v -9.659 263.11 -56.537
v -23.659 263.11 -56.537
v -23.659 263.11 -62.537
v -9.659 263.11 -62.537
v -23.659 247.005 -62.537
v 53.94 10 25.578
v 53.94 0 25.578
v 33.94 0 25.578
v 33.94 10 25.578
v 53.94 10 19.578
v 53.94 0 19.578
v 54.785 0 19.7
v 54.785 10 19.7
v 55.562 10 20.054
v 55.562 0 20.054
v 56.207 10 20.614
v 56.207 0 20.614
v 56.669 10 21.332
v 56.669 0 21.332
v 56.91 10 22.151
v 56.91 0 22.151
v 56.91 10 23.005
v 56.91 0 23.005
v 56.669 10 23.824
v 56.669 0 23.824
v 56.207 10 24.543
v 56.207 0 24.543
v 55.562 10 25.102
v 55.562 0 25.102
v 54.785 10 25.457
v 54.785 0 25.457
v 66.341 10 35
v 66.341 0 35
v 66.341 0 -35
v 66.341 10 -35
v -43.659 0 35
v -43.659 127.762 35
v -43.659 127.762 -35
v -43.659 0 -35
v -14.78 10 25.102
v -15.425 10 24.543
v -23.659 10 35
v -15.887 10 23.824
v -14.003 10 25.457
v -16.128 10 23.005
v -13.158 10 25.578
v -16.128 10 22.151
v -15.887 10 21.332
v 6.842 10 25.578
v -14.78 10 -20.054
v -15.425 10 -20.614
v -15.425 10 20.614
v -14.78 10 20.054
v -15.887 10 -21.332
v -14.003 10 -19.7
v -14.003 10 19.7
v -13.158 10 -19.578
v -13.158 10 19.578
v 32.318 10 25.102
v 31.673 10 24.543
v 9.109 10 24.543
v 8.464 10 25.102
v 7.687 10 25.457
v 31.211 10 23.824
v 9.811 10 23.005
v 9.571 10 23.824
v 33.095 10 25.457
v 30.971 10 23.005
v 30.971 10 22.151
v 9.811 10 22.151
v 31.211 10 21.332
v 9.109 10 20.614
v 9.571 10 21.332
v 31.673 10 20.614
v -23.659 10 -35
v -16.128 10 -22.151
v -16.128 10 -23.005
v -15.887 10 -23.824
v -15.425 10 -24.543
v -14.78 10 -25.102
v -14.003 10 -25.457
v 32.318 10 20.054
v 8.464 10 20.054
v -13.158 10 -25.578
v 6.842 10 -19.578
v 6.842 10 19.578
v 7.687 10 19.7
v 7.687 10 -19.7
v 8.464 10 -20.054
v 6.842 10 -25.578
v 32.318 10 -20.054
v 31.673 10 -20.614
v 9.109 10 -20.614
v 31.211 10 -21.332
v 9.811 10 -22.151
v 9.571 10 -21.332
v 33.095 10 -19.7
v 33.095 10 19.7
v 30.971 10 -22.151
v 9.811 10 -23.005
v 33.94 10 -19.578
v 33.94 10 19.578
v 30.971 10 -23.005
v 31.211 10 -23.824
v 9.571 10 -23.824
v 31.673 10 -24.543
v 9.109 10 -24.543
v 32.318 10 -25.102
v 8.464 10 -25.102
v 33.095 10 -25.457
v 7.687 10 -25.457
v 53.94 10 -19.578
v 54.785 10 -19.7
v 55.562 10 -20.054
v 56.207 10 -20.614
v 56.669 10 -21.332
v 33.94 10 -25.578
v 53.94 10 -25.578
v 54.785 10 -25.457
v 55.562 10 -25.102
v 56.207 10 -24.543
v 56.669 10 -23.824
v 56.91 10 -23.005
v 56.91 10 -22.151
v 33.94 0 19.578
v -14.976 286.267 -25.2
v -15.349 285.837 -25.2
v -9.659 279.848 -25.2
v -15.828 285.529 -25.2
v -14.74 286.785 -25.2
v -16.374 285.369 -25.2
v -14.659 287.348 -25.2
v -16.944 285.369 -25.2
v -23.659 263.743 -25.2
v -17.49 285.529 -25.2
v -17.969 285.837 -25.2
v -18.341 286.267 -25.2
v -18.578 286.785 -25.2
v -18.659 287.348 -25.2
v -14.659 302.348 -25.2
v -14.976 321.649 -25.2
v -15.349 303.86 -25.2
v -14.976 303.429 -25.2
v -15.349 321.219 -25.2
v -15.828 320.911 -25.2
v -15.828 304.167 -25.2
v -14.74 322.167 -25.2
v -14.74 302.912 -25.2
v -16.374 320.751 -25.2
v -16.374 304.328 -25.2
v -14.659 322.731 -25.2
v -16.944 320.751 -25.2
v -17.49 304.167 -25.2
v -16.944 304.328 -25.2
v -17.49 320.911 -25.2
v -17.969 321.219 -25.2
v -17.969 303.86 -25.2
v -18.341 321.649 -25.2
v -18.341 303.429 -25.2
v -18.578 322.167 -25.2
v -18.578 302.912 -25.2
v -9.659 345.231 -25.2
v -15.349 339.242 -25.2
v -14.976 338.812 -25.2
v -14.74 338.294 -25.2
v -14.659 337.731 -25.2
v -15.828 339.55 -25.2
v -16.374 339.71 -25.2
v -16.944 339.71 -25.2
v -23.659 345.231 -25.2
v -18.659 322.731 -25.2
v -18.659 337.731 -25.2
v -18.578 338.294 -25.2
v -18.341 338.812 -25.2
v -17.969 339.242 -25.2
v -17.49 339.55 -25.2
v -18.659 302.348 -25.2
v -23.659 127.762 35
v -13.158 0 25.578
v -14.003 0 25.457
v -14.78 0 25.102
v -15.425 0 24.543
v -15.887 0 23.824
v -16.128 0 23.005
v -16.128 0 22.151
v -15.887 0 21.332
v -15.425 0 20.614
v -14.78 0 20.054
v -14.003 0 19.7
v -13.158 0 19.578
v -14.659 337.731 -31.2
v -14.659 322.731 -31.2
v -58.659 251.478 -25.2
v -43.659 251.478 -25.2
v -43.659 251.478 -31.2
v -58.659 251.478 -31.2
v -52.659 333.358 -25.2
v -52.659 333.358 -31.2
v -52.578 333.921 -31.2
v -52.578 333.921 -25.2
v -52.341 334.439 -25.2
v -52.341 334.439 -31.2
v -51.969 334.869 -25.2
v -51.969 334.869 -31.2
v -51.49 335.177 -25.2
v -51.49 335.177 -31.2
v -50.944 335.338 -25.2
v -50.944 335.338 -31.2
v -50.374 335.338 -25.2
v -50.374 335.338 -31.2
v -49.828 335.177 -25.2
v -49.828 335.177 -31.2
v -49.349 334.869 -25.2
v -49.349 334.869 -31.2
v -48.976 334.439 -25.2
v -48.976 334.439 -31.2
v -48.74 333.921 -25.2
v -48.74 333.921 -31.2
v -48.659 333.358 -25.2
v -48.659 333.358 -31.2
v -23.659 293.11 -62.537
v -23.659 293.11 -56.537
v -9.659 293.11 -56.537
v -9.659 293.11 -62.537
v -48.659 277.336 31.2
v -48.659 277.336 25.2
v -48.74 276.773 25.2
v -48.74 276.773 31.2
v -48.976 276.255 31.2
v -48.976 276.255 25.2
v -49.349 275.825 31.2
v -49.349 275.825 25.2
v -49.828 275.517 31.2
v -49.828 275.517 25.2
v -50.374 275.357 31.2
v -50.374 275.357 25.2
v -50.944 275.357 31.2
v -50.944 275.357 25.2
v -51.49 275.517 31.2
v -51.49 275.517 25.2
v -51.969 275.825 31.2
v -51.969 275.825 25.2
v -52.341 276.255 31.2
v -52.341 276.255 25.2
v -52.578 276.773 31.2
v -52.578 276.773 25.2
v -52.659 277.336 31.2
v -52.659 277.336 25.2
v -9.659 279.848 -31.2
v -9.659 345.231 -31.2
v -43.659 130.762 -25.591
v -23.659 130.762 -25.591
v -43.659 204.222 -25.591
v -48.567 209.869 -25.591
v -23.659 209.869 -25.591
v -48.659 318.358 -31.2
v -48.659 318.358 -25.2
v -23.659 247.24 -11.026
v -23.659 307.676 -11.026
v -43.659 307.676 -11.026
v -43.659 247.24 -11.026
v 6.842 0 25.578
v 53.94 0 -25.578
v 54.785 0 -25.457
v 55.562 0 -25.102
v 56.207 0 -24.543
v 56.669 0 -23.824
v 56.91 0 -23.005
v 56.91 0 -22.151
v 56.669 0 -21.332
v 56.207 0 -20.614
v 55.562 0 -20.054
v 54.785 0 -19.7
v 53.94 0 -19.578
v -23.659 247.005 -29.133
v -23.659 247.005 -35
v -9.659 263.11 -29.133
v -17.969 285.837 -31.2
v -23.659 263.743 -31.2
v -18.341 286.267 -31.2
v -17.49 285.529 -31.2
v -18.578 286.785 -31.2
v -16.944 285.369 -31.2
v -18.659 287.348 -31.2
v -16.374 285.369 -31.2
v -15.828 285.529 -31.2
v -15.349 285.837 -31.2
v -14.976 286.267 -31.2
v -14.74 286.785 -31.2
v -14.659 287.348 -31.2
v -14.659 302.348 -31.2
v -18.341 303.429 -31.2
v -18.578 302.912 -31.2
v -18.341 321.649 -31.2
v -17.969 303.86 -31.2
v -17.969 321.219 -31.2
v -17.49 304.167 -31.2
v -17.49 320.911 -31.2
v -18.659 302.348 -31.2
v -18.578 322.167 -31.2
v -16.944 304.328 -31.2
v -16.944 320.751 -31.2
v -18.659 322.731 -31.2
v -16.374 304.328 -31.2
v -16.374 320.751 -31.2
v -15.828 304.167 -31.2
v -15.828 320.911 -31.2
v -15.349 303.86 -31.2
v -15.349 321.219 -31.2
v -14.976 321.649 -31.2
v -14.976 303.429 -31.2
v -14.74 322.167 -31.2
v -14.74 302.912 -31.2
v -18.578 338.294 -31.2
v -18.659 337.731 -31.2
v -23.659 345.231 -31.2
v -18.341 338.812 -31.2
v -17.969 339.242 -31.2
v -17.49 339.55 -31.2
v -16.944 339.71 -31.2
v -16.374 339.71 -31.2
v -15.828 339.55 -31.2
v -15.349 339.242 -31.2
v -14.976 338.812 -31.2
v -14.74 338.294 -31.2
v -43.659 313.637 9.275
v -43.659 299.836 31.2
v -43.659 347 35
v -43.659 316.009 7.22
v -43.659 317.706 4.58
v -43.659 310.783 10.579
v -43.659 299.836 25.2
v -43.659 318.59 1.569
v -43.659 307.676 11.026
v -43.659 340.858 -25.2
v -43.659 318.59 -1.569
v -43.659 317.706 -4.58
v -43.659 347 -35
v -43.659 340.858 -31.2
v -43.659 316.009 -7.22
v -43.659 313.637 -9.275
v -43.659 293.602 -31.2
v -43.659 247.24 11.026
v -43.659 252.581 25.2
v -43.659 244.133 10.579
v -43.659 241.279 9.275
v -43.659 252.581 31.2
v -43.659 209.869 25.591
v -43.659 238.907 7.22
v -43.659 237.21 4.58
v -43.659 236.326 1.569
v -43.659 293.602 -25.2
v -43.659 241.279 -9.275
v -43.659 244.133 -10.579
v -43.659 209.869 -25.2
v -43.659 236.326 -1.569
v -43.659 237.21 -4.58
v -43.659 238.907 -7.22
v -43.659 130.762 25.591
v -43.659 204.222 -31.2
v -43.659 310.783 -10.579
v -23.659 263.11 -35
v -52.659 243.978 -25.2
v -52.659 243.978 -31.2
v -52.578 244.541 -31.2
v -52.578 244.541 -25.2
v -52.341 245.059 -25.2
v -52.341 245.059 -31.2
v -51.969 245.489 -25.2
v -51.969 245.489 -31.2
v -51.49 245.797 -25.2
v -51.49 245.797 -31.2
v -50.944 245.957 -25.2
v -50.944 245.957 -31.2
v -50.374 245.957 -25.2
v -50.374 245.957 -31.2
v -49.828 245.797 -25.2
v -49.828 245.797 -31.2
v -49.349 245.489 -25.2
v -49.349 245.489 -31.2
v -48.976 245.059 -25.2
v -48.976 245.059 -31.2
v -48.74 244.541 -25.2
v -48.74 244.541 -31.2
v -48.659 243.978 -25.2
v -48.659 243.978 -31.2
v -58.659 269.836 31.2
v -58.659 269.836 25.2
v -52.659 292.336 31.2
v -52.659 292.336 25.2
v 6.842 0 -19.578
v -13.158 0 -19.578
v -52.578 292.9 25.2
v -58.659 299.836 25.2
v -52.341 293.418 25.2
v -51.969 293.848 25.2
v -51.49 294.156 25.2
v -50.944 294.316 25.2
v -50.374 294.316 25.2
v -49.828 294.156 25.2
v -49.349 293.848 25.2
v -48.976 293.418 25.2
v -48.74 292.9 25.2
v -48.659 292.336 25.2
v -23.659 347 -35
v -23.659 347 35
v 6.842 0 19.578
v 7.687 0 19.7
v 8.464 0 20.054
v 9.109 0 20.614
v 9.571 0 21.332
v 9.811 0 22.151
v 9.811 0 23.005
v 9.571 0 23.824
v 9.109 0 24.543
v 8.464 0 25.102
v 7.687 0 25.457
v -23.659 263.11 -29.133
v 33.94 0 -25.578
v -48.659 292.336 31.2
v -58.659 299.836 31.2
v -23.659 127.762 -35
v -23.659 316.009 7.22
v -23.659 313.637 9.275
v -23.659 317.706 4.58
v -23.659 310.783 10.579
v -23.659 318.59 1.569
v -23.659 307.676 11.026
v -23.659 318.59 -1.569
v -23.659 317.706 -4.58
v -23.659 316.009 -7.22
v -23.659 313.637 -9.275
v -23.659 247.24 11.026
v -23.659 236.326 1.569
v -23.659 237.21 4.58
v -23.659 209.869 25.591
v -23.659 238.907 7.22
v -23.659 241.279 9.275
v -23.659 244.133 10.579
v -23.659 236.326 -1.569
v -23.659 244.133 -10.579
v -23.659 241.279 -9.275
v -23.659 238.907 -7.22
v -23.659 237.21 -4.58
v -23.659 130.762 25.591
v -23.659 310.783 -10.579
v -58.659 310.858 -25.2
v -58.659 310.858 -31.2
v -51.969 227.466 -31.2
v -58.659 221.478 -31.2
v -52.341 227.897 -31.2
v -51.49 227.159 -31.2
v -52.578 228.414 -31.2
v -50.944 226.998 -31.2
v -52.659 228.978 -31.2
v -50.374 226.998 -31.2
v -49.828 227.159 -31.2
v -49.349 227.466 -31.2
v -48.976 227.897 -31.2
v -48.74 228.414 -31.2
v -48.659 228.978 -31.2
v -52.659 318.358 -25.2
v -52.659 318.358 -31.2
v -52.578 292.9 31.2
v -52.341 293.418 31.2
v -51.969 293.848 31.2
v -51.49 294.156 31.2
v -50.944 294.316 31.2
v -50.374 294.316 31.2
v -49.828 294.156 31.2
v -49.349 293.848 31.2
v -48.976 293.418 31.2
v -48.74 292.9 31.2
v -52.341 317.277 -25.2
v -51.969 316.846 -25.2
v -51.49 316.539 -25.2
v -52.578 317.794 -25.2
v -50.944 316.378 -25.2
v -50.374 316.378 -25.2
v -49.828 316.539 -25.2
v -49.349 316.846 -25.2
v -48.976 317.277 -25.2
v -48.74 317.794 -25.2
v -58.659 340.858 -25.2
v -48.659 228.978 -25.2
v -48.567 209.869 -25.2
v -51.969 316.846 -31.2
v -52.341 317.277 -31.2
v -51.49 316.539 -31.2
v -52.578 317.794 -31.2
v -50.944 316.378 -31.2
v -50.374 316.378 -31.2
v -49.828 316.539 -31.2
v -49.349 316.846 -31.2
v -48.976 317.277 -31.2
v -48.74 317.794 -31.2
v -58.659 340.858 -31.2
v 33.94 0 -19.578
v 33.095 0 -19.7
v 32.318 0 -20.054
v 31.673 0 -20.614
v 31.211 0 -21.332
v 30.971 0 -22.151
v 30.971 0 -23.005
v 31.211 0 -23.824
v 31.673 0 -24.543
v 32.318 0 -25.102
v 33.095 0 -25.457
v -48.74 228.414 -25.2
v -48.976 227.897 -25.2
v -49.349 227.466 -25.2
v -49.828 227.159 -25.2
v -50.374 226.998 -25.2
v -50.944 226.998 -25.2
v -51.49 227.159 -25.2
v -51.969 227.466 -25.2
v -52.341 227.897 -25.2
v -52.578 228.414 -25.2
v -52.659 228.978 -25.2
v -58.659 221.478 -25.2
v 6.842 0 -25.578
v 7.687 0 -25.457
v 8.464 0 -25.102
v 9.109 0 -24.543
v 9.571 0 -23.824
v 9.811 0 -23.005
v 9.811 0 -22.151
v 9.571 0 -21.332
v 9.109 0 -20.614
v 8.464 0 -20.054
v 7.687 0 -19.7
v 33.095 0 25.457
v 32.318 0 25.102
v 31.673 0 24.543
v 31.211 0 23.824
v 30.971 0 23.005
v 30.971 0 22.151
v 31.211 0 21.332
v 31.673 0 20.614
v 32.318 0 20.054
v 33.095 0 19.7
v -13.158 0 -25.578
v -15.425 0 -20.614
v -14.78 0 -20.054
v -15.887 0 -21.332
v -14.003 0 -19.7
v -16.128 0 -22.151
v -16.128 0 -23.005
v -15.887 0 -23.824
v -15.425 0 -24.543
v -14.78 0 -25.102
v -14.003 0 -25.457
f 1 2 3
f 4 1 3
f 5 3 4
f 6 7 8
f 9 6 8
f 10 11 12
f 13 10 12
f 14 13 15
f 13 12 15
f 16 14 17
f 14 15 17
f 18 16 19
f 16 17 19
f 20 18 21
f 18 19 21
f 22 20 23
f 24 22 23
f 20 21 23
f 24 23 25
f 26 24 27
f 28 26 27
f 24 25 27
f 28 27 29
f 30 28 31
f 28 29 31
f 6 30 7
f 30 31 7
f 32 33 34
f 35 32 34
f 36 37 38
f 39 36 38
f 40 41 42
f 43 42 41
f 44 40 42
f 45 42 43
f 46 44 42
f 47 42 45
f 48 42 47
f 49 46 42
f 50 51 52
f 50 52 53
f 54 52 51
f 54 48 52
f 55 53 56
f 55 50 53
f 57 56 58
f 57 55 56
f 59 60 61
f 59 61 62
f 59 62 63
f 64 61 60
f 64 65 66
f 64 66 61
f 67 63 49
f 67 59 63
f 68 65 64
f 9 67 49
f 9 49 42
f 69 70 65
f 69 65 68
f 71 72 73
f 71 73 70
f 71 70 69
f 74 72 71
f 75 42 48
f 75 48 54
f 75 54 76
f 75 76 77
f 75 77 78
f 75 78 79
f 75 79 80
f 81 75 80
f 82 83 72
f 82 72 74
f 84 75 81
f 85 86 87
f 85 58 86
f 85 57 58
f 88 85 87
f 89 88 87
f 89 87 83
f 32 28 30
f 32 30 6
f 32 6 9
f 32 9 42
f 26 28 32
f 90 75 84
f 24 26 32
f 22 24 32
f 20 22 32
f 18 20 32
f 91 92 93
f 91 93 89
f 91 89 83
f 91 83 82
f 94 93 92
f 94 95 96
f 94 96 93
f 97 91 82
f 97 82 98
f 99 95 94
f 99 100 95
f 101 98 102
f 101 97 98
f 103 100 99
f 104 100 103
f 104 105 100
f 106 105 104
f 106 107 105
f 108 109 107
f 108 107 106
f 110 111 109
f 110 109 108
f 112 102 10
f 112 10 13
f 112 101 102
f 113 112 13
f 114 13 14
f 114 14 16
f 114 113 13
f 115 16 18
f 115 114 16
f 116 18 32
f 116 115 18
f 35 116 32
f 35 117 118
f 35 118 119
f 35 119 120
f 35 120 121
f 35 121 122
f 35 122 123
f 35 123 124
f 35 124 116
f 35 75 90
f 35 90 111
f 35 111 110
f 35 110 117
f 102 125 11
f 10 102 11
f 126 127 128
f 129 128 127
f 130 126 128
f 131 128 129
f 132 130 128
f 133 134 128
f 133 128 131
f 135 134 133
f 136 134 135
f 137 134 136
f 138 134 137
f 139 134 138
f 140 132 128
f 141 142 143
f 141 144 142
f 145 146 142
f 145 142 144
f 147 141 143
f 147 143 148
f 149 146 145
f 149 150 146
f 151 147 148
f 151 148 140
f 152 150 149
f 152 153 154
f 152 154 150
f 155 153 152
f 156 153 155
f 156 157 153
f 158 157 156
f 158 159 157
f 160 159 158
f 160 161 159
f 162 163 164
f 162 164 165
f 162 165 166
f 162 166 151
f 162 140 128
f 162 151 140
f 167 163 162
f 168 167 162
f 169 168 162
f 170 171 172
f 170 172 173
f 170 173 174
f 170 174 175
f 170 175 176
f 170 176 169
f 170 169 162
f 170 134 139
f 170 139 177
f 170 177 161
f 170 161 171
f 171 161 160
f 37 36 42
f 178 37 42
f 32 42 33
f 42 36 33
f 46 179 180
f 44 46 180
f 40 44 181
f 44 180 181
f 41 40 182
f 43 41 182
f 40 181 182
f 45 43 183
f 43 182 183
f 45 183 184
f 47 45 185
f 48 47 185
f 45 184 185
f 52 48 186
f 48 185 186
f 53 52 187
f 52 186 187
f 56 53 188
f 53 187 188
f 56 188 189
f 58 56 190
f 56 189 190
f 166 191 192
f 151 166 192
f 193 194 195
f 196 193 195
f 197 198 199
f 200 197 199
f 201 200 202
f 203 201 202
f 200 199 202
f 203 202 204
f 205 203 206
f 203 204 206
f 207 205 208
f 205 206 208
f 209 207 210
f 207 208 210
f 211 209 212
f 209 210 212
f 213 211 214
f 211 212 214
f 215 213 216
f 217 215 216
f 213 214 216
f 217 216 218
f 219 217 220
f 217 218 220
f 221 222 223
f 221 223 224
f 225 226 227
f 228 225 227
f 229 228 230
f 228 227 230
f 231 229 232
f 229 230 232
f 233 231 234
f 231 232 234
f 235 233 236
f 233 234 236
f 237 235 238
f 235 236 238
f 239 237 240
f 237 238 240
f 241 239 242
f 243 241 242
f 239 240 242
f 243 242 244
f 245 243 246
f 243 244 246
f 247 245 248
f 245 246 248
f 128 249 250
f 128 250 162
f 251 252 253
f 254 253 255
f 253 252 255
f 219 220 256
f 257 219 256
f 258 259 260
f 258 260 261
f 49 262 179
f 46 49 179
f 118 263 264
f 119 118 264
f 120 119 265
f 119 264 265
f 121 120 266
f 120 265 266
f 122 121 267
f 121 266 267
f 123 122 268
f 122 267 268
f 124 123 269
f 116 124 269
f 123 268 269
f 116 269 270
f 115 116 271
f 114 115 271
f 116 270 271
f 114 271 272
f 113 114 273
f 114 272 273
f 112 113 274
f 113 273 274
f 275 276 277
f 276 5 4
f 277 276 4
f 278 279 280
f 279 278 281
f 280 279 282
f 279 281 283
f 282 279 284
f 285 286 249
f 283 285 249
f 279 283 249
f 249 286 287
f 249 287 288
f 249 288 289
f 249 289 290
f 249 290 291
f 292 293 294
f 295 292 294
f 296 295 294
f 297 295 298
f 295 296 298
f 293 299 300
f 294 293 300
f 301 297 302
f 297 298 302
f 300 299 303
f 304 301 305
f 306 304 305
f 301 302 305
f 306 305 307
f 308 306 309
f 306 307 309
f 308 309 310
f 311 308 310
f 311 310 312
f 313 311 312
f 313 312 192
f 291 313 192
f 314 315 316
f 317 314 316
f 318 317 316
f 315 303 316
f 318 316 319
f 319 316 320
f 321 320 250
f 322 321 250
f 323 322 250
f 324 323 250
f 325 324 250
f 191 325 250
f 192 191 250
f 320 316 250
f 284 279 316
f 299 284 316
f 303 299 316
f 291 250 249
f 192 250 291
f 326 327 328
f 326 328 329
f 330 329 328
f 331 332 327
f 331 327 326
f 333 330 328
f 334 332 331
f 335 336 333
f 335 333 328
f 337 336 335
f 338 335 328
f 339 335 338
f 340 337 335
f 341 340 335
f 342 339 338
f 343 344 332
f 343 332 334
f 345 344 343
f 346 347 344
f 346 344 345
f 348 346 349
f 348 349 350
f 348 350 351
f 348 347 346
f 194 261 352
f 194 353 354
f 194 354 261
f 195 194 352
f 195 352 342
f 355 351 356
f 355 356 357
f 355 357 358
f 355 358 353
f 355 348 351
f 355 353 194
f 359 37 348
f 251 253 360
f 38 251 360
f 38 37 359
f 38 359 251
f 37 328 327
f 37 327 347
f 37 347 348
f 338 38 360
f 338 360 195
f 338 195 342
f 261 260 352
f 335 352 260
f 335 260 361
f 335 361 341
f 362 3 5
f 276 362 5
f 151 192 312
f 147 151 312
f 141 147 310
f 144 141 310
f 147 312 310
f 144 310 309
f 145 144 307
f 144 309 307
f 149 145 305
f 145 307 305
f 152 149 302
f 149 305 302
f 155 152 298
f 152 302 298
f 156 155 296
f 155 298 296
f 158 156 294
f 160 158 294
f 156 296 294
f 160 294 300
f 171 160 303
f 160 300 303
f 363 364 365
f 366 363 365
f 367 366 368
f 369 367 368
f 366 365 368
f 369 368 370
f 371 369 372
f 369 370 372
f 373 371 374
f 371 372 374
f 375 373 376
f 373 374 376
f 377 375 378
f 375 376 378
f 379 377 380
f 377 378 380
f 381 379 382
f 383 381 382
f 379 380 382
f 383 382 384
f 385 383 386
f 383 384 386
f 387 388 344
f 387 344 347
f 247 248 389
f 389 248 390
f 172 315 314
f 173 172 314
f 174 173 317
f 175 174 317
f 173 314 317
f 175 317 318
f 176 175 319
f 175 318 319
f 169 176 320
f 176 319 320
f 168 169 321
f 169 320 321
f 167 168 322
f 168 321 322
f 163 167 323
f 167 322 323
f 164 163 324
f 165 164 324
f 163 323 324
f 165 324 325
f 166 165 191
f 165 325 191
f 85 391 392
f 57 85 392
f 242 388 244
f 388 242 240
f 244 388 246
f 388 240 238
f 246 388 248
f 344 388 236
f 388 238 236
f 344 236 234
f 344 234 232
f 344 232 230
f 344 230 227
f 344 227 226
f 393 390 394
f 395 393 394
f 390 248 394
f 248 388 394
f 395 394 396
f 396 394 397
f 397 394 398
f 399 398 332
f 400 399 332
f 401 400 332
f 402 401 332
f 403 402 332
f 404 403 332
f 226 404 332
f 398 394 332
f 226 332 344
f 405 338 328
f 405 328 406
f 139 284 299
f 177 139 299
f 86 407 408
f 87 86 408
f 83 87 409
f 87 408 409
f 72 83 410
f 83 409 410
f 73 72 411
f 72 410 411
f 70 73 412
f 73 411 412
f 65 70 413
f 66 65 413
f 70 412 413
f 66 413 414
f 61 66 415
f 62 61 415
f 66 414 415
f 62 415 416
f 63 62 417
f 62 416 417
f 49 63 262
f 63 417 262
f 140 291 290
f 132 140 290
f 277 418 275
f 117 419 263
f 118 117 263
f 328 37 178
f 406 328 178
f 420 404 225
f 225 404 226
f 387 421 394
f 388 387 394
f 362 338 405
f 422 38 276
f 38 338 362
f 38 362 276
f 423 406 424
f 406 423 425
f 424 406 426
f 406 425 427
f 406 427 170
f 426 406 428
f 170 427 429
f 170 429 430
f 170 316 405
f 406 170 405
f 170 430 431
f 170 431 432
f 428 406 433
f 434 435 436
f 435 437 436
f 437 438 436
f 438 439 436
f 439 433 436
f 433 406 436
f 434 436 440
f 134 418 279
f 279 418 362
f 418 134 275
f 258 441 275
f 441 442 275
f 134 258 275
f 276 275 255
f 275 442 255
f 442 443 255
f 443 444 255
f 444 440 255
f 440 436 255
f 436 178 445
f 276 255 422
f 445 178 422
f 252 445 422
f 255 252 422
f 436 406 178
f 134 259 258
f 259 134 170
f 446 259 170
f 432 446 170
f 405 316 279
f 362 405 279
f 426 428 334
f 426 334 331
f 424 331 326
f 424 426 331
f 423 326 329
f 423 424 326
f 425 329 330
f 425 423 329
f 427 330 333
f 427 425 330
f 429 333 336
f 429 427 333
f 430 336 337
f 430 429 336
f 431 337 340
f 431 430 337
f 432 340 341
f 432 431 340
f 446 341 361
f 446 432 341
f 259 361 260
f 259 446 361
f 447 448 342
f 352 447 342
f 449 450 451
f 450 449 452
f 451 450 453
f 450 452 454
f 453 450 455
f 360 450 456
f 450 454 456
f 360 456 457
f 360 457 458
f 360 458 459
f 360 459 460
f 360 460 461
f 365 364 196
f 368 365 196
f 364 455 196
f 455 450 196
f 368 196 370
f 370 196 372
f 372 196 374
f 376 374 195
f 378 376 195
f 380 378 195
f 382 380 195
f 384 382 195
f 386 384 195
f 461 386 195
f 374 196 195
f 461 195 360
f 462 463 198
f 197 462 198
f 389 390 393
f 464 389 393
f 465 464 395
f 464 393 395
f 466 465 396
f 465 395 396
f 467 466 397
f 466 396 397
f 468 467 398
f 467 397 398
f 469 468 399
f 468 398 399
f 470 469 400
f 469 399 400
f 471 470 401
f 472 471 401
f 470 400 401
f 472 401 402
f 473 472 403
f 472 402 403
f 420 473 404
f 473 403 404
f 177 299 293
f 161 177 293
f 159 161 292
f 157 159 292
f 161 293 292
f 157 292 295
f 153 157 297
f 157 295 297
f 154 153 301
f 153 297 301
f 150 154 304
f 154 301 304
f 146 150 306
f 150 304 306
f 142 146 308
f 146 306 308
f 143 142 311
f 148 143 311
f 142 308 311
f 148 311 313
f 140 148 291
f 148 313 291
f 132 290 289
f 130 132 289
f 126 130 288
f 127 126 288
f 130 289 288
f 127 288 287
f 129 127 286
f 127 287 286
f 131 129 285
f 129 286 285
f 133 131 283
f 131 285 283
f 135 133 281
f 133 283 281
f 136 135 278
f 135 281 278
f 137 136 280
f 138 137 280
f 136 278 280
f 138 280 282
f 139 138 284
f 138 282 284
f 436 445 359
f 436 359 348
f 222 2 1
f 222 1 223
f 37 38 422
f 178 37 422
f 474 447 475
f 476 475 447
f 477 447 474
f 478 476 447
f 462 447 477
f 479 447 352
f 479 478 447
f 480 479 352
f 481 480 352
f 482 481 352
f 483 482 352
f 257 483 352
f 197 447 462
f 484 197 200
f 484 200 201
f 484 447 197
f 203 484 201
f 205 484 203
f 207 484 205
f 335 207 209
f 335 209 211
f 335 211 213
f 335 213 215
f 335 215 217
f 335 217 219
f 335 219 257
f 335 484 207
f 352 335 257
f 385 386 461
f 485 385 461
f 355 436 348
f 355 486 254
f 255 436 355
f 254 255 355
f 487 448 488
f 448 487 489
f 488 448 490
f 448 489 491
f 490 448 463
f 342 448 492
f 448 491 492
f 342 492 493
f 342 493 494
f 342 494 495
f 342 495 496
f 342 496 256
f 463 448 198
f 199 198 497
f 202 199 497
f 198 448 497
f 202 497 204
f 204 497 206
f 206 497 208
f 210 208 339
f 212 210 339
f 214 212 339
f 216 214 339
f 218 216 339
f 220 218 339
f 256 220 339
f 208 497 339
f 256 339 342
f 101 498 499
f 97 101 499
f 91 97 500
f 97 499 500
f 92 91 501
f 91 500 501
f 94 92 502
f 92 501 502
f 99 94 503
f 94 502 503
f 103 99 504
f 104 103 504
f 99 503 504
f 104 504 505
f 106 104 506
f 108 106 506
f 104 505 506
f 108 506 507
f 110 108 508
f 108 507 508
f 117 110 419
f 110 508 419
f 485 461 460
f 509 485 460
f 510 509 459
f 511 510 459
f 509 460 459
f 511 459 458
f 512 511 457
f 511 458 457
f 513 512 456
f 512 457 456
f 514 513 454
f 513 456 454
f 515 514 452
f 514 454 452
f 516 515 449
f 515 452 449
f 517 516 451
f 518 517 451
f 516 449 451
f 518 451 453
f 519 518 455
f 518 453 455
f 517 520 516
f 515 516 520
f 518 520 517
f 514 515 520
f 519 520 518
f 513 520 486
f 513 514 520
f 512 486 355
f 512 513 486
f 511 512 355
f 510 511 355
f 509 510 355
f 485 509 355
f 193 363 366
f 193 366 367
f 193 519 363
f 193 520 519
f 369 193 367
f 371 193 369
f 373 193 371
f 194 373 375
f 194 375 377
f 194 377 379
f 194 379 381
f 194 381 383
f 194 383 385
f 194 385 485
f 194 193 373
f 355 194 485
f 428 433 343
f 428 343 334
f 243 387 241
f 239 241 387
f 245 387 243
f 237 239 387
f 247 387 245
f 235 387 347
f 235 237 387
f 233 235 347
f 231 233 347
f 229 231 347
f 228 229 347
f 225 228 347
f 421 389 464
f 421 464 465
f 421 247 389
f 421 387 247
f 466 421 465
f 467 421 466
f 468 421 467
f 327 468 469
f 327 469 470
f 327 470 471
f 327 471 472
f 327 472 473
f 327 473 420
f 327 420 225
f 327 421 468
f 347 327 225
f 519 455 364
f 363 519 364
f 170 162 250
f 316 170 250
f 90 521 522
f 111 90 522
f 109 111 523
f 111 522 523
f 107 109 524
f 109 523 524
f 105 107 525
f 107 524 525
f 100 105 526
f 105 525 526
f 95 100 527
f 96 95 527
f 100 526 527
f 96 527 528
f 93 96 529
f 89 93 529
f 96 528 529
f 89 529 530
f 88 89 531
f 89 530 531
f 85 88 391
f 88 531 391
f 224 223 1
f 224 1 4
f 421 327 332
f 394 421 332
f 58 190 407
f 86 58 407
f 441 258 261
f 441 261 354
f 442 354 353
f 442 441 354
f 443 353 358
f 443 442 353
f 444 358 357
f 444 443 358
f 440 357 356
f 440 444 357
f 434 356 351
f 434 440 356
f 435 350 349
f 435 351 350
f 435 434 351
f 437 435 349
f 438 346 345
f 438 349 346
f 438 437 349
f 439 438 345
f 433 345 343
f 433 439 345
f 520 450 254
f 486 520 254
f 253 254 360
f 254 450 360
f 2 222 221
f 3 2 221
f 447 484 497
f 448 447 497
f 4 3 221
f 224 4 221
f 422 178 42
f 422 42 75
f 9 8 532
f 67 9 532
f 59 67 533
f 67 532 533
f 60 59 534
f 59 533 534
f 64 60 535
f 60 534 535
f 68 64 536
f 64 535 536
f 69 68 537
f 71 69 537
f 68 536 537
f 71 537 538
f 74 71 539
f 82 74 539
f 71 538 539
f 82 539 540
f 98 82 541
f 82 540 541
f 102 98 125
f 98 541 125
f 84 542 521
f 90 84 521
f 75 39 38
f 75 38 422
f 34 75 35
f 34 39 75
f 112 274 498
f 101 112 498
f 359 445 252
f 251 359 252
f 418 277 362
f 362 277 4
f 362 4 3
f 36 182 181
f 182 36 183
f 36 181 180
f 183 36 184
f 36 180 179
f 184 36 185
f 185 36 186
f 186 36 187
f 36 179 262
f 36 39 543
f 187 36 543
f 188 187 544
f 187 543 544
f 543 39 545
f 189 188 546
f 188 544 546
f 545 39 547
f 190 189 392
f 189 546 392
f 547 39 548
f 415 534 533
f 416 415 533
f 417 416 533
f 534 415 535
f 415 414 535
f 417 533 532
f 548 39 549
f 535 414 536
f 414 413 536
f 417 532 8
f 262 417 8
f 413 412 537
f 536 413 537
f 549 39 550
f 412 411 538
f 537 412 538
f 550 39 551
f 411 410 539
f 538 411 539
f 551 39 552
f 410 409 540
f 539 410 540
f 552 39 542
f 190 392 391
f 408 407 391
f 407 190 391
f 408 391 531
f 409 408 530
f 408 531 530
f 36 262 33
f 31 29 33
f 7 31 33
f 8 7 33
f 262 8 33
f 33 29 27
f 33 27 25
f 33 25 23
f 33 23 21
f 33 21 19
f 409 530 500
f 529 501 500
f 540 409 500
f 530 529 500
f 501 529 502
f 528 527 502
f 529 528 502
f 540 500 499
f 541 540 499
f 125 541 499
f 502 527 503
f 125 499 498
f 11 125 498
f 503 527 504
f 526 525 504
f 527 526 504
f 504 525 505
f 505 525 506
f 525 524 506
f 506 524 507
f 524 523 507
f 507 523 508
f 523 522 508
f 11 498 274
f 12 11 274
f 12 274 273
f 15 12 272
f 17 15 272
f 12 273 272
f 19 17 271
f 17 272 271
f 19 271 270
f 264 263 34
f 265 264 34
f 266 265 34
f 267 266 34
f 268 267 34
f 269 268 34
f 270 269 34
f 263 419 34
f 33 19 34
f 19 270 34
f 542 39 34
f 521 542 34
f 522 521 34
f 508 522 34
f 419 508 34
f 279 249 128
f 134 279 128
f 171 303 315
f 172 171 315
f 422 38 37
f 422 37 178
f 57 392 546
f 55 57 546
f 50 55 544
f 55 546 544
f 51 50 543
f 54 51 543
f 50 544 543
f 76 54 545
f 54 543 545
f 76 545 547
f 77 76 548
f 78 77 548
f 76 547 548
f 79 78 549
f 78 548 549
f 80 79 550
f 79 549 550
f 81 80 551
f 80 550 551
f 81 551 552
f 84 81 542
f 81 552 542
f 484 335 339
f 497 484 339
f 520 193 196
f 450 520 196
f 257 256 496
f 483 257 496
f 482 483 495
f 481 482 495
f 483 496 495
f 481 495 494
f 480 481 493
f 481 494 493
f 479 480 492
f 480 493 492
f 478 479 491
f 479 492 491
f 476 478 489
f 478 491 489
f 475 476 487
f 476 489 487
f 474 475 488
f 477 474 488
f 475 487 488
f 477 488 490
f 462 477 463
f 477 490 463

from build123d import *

# Parameters (mm, degrees)
SKETCH1_W               = 20
SKETCH1_H               = 70
SKETCH1_W_2             = 90
BOSS_EXTRUDE1_DEPTH     = 10
SKETCH1_3_W             = 20
SKETCH1_3_H             = 70
BOSS_EXTRUDE2_DEPTH     = 212
BOSS_EXTRUDE3_START     = -20
SKETCH2_W               = 6
SKETCH2_H               = 30
BOSS_EXTRUDE3_DEPTH     = 15
BOSS_EXTRUDE3_2_DEPTH   = 15
BOSS_EXTRUDE3_3_DEPTH   = 15
CUT_EXTRUDE3_DEPTH      = 353.433372815
CUT_EXTRUDE3_DEPTH_BACK = 127.2
SKETCH7_W               = 20
SKETCH7_H               = 70
BOSS_EXTRUDE4_DEPTH     = 135
SKETCH12_W              = 15
SKETCH12_H              = 6
BOSS_EXTRUDE6_DEPTH     = 24.325180813
BOSS_EXTRUDE7_START     = -31.2
BOSS_EXTRUDE7_DEPTH     = 6
BOSS_EXTRUDE8_START     = -31.2
BOSS_EXTRUDE8_DEPTH     = 6
SKETCH3_W               = 51.18180782
SKETCH3_H               = 79.106689165
CUT_EXTRUDE1_DEPTH      = 60
SKETCH17_W              = 6
SKETCH17_H              = 30
BOSS_EXTRUDE9_DEPTH     = 14
CUT_EXTRUDE4_DEPTH      = 14
BOSS_EXTRUDE11_START    = -62.536720157
BOSS_EXTRUDE11_DEPTH    = 33.403488582
SKETCH23_W              = 14
SKETCH23_H              = 6
BOSS_EXTRUDE12_DEPTH    = 28.275172031
SKETCH24_W              = 14
SKETCH24_H              = 6
BOSS_EXTRUDE13_DEPTH    = 5.382525931


with BuildPart() as part:
    # Sketch1 → Boss-Extrude1 (new body)
    # profile 1 of 2: a face of its own
    with BuildSketch(Plane(origin=(0, 0, 0), x_dir=(1, 0, 0), z_dir=(0, 1, 0))):
        with Locations((-33.658940342, 0)):
            Rectangle(SKETCH1_W, SKETCH1_H)
    # profile 2 of 2: a face of its own
    with BuildSketch(Plane(origin=(0, 0, 0), x_dir=(1, 0, 0), z_dir=(0, 1, 0))):
        with Locations((21.341059658, 0)):
            Rectangle(SKETCH1_W_2, SKETCH1_H)
        with BuildLine():
            Line((6.841826819, -25.578170589), (-13.158173181, -25.578170589))
            ThreePointArc((-13.158173181, -25.578170589), (-16.158173181, -22.578170589), (-13.158173181, -19.578170589))
            Line((-13.158173181, -19.578170589), (6.841826819, -19.578170589))
            ThreePointArc((6.841826819, -19.578170589), (9.841826819, -22.578170589), (6.841826819, -25.578170589))
        make_face(mode=Mode.SUBTRACT)
        with BuildLine():
            ThreePointArc((53.940052041, -19.578170589), (56.940052041, -22.578170589), (53.940052041, -25.578170589))
            Line((53.940052041, -25.578170589), (33.940052041, -25.578170589))
            ThreePointArc((33.940052041, -25.578170589), (30.940052041, -22.578170589), (33.940052041, -19.578170589))
            Line((33.940052041, -19.578170589), (53.940052041, -19.578170589))
        make_face(mode=Mode.SUBTRACT)
        with BuildLine():
            ThreePointArc((-13.158173181, 19.578170589), (-16.158173181, 22.578170589), (-13.158173181, 25.578170589))
            Line((-13.158173181, 25.578170589), (6.841826819, 25.578170589))
            ThreePointArc((6.841826819, 25.578170589), (9.841826819, 22.578170589), (6.841826819, 19.578170589))
            Line((6.841826819, 19.578170589), (-13.158173181, 19.578170589))
        make_face(mode=Mode.SUBTRACT)
        with BuildLine():
            Line((33.940052041, 25.578170589), (53.940052041, 25.578170589))
            ThreePointArc((53.940052041, 25.578170589), (56.940052041, 22.578170589), (53.940052041, 19.578170589))
            Line((53.940052041, 19.578170589), (33.940052041, 19.578170589))
            ThreePointArc((33.940052041, 19.578170589), (30.940052041, 22.578170589), (33.940052041, 25.578170589))
        make_face(mode=Mode.SUBTRACT)
    extrude(amount=BOSS_EXTRUDE1_DEPTH)

    # Sketch1<3> → Boss-Extrude2 (add)
    with BuildSketch(Plane(origin=(0, 0, 0), x_dir=(1, 0, 0), z_dir=(0, 1, 0))):
        with Locations((-33.658940342, 0)):
            Rectangle(SKETCH1_3_W, SKETCH1_3_H)
    extrude(amount=BOSS_EXTRUDE2_DEPTH)


with BuildPart() as body_2:
    # Sketch2 → Boss-Extrude3 (new body)
    with BuildSketch(Plane(origin=(-23.658940342, 0, 0), x_dir=(0, 0, -1), z_dir=(1, 0, 0)).offset(BOSS_EXTRUDE3_START)):
        with Locations((-28.2, 284.836255525)):
            Rectangle(SKETCH2_W, SKETCH2_H)
    extrude(amount=-BOSS_EXTRUDE3_DEPTH)


with BuildPart() as body_3:
    # Sketch2 → Boss-Extrude3 2 (new body)
    with BuildSketch(Plane(origin=(-23.658940342, 0, 0), x_dir=(0, 0, -1), z_dir=(1, 0, 0)).offset(BOSS_EXTRUDE3_START)):
        with Locations((28.2, 236.477808494)):
            Rectangle(SKETCH2_W, SKETCH2_H)
    extrude(amount=-BOSS_EXTRUDE3_2_DEPTH)


with BuildPart() as body_4:
    # Sketch2 → Boss-Extrude3 3 (new body)
    with BuildSketch(Plane(origin=(-23.658940342, 0, 0), x_dir=(0, 0, -1), z_dir=(1, 0, 0)).offset(BOSS_EXTRUDE3_START)):
        with Locations((28.2, 325.85789719)):
            Rectangle(SKETCH2_W, SKETCH2_H)
    extrude(amount=-BOSS_EXTRUDE3_3_DEPTH)


with BuildPart() as cut_extrude3_tool:
    # Sketch5 → Cut-Extrude3 (new, two sides: drawn at the far end of the back side and taken through both)
    with BuildSketch(Plane.XY.offset(-25.2).offset(-CUT_EXTRUDE3_DEPTH_BACK)):
        with BuildLine():
            Line((-48.658940342, 292.336255525), (-48.658940342, 277.336255525))
            ThreePointArc((-48.658940342, 277.336255525), (-50.658940342, 275.336255525), (-52.658940342, 277.336255525))
            Line((-52.658940342, 277.336255525), (-52.658940342, 292.336255525))
            ThreePointArc((-52.658940342, 292.336255525), (-50.658940342, 294.336255525), (-48.658940342, 292.336255525))
        make_face()
        with BuildLine():
            Line((-48.658940342, 243.977808494), (-48.658940342, 228.977808494))
            ThreePointArc((-48.658940342, 228.977808494), (-50.658940342, 226.977808494), (-52.658940342, 228.977808494))
            Line((-52.658940342, 228.977808494), (-52.658940342, 243.977808494))
            ThreePointArc((-52.658940342, 243.977808494), (-50.658940342, 245.977808494), (-48.658940342, 243.977808494))
        make_face()
        with BuildLine():
            Line((-48.658940342, 333.35789719), (-48.658940342, 318.35789719))
            ThreePointArc((-48.658940342, 318.35789719), (-50.658940342, 316.35789719), (-52.658940342, 318.35789719))
            Line((-52.658940342, 318.35789719), (-52.658940342, 333.35789719))
            ThreePointArc((-52.658940342, 333.35789719), (-50.658940342, 335.35789719), (-48.658940342, 333.35789719))
        make_face()
    extrude(amount=CUT_EXTRUDE3_DEPTH + CUT_EXTRUDE3_DEPTH_BACK)


with BuildPart() as body_2_1:
    add(body_2.part)

    # Cut-Extrude3: cut by cut_extrude3_tool
    add(cut_extrude3_tool.part, mode=Mode.SUBTRACT)



with BuildPart() as body_3_1:
    add(body_3.part)

    # Cut-Extrude3: cut by cut_extrude3_tool
    add(cut_extrude3_tool.part, mode=Mode.SUBTRACT)


with BuildPart() as body_4_1:
    add(body_4.part)

    # Cut-Extrude3: cut by cut_extrude3_tool
    add(cut_extrude3_tool.part, mode=Mode.SUBTRACT)


with BuildPart() as body_2_2:
    add(body_2_1.part)

    add(body_4_1.part)  # Boss-Extrude4 merges body 4

    add(part.part)  # Boss-Extrude4 merges part
    # Sketch7 → Boss-Extrude4 (add)
    with BuildSketch(Plane(origin=(0, 212, 0), x_dir=(1, 0, 0), z_dir=(0, 1, 0))):
        with Locations((-33.658940342, 0)):
            Rectangle(SKETCH7_W, SKETCH7_H)
    extrude(amount=BOSS_EXTRUDE4_DEPTH)

    # Sketch12 → Boss-Extrude6 (add, along a direction that is not the sketch's normal)
    with BuildSketch(Plane.XZ.offset(-269.836255525)):
        with Locations((-51.158940342, 28.2)):
            Rectangle(SKETCH12_W, SKETCH12_H)
    extrude(amount=BOSS_EXTRUDE6_DEPTH, dir=(0.6560590289905114, -0.7547095802227685, 0))

    # Boss-Extrude7: read off the stored shape, not the designer's step
    # Boss-Extrude7 outline → Boss-Extrude7 (add)
    with BuildSketch(Plane.XY.offset(BOSS_EXTRUDE7_START)):
        Polygon((-58.658940342, 310.85789719), (-43.658940342, 293.602371082), (-43.658940342, 310.85789719), align=None)
    extrude(amount=BOSS_EXTRUDE7_DEPTH)


    add(body_3_1.part)  # Boss-Extrude8 merges body 3
    # Boss-Extrude8: read off the stored shape, not the designer's step
    # Boss-Extrude8 outline → Boss-Extrude8 (add)
    with BuildSketch(Plane.XY.offset(BOSS_EXTRUDE8_START)):
        Polygon((-58.658940342, 221.477808494), (-43.658940342, 204.222282386), (-43.658940342, 221.477808494), align=None)
    extrude(amount=BOSS_EXTRUDE8_DEPTH)

    # Sketch3 → Cut-Extrude1 (cut)
    with BuildSketch(Plane(origin=(-23.658940342, 0, 0), x_dir=(0, 0, -1), z_dir=(1, 0, 0))):
        with Locations((0, 170.315397104)):
            Rectangle(SKETCH3_W, SKETCH3_H)
        with BuildLine():
            Line((11.025757264, 307.676468372), (11.025757264, 247.23954324))
            ThreePointArc((11.025757264, 247.23954324), (0, 236.213785975), (-11.025757264, 247.23954324))
            Line((-11.025757264, 247.23954324), (-11.025757264, 307.676468372))
            ThreePointArc((-11.025757264, 307.676468372), (0, 318.702225636), (11.025757264, 307.676468372))
        make_face()
    extrude(amount=-CUT_EXTRUDE1_DEPTH, mode=Mode.SUBTRACT)

    # Sketch17 → Boss-Extrude9 (add)
    with BuildSketch(Plane(origin=(-23.658940342, 0, 0), x_dir=(0, 0, -1), z_dir=(1, 0, 0))):
        with Locations((28.2, 330.230671493)):
            Rectangle(SKETCH17_W, SKETCH17_H)
        with Locations((28.2, 294.848145562)):
            Rectangle(SKETCH17_W, SKETCH17_H)
        with Locations((59.536720157, 278.109746531)):
            Rectangle(SKETCH17_W, SKETCH17_H)
    extrude(amount=BOSS_EXTRUDE9_DEPTH)


with BuildPart() as boss_extrude9_piece_1:
    # of the separate pieces the step leaves, piece 1, a body of its own (boss_extrude9_pieces)
    add(body_2_2.part.solids().sort_by_distance((-43.658940342, 0, -35))[0])

    # Sketch18 → Cut-Extrude4 (cut)
    with BuildSketch(Plane(origin=(0, 0, -31.2), x_dir=(-1, 0, 0), z_dir=(0, 0, -1))):
        with BuildLine():
            Line((14.658940342, 302.348145562), (14.658940342, 287.348145562))
            ThreePointArc((14.658940342, 287.348145562), (16.658940342, 285.348145562), (18.658940342, 287.348145562))
            Line((18.658940342, 287.348145562), (18.658940342, 302.348145562))
            ThreePointArc((18.658940342, 302.348145562), (16.658940342, 304.348145562), (14.658940342, 302.348145562))
        make_face()
        with BuildLine():
            ThreePointArc((18.658940342, 337.730671493), (16.658940342, 339.730671493), (14.658940342, 337.730671493))
            Line((14.658940342, 337.730671493), (14.658940342, 322.730671493))
            ThreePointArc((14.658940342, 322.730671493), (16.658940342, 320.730671493), (18.658940342, 322.730671493))
            Line((18.658940342, 322.730671493), (18.658940342, 337.730671493))
        make_face()
    extrude(amount=-CUT_EXTRUDE4_DEPTH, mode=Mode.SUBTRACT)


with BuildPart() as boss_extrude9_piece_2:
    # of the separate pieces the step leaves, piece 2, a body of its own (boss_extrude9_pieces)
    add(body_2_2.part.solids().sort_by_distance((-23.658940342, 293.109746531, -56.536720157))[0])


with BuildPart() as body_3_2:
    # Intersect1: read off the stored shape, not the designer's step
    # Intersect1: the piece on the far side of the plane
    add(boss_extrude9_piece_1.part)
    split(bisect_by=Plane(origin=(0, 127.762052521, 0), x_dir=(1, 0, 0), z_dir=(0, 1, 0)), keep=Keep.BOTTOM)


with BuildPart() as boss_extrude9_piece_1_1:
    add(boss_extrude9_piece_1.part)

    # Intersect1
    split(bisect_by=Plane(origin=(0, 127.762052521, 0), x_dir=(1, 0, 0), z_dir=(0, 1, 0)), keep=Keep.TOP)

    # Boss-Extrude11: read off the stored shape, not the designer's step
    # Boss-Extrude11 outline → Boss-Extrude11 (add)
    with BuildSketch(Plane.XY.offset(BOSS_EXTRUDE11_START)):
        Polygon((-9.658940342, 263.109746531), (-23.658940342, 263.109746531), (-23.658940342, 247.00458883), align=None)
    extrude(amount=BOSS_EXTRUDE11_DEPTH)

    # Sketch23 → Boss-Extrude12 (add, along a direction that is not the sketch's normal)
    with BuildSketch(Plane.XZ.offset(-279.848145562)):
        with Locations((-16.658940342, -28.2)):
            Rectangle(SKETCH23_W, SKETCH23_H)
    extrude(amount=BOSS_EXTRUDE12_DEPTH, dir=(-0.6560590289905113, -0.7547095802227686, 0))

    # Sketch24 → Boss-Extrude13 (add)
    with BuildSketch(Plane.XZ.offset(-315.230671493)):
        with Locations((-16.658940342, -28.2)):
            Rectangle(SKETCH24_W, SKETCH24_H)
    extrude(amount=BOSS_EXTRUDE13_DEPTH)


solid = Compound([boss_extrude9_piece_2.part, body_3_2.part, boss_extrude9_piece_1_1.part])
